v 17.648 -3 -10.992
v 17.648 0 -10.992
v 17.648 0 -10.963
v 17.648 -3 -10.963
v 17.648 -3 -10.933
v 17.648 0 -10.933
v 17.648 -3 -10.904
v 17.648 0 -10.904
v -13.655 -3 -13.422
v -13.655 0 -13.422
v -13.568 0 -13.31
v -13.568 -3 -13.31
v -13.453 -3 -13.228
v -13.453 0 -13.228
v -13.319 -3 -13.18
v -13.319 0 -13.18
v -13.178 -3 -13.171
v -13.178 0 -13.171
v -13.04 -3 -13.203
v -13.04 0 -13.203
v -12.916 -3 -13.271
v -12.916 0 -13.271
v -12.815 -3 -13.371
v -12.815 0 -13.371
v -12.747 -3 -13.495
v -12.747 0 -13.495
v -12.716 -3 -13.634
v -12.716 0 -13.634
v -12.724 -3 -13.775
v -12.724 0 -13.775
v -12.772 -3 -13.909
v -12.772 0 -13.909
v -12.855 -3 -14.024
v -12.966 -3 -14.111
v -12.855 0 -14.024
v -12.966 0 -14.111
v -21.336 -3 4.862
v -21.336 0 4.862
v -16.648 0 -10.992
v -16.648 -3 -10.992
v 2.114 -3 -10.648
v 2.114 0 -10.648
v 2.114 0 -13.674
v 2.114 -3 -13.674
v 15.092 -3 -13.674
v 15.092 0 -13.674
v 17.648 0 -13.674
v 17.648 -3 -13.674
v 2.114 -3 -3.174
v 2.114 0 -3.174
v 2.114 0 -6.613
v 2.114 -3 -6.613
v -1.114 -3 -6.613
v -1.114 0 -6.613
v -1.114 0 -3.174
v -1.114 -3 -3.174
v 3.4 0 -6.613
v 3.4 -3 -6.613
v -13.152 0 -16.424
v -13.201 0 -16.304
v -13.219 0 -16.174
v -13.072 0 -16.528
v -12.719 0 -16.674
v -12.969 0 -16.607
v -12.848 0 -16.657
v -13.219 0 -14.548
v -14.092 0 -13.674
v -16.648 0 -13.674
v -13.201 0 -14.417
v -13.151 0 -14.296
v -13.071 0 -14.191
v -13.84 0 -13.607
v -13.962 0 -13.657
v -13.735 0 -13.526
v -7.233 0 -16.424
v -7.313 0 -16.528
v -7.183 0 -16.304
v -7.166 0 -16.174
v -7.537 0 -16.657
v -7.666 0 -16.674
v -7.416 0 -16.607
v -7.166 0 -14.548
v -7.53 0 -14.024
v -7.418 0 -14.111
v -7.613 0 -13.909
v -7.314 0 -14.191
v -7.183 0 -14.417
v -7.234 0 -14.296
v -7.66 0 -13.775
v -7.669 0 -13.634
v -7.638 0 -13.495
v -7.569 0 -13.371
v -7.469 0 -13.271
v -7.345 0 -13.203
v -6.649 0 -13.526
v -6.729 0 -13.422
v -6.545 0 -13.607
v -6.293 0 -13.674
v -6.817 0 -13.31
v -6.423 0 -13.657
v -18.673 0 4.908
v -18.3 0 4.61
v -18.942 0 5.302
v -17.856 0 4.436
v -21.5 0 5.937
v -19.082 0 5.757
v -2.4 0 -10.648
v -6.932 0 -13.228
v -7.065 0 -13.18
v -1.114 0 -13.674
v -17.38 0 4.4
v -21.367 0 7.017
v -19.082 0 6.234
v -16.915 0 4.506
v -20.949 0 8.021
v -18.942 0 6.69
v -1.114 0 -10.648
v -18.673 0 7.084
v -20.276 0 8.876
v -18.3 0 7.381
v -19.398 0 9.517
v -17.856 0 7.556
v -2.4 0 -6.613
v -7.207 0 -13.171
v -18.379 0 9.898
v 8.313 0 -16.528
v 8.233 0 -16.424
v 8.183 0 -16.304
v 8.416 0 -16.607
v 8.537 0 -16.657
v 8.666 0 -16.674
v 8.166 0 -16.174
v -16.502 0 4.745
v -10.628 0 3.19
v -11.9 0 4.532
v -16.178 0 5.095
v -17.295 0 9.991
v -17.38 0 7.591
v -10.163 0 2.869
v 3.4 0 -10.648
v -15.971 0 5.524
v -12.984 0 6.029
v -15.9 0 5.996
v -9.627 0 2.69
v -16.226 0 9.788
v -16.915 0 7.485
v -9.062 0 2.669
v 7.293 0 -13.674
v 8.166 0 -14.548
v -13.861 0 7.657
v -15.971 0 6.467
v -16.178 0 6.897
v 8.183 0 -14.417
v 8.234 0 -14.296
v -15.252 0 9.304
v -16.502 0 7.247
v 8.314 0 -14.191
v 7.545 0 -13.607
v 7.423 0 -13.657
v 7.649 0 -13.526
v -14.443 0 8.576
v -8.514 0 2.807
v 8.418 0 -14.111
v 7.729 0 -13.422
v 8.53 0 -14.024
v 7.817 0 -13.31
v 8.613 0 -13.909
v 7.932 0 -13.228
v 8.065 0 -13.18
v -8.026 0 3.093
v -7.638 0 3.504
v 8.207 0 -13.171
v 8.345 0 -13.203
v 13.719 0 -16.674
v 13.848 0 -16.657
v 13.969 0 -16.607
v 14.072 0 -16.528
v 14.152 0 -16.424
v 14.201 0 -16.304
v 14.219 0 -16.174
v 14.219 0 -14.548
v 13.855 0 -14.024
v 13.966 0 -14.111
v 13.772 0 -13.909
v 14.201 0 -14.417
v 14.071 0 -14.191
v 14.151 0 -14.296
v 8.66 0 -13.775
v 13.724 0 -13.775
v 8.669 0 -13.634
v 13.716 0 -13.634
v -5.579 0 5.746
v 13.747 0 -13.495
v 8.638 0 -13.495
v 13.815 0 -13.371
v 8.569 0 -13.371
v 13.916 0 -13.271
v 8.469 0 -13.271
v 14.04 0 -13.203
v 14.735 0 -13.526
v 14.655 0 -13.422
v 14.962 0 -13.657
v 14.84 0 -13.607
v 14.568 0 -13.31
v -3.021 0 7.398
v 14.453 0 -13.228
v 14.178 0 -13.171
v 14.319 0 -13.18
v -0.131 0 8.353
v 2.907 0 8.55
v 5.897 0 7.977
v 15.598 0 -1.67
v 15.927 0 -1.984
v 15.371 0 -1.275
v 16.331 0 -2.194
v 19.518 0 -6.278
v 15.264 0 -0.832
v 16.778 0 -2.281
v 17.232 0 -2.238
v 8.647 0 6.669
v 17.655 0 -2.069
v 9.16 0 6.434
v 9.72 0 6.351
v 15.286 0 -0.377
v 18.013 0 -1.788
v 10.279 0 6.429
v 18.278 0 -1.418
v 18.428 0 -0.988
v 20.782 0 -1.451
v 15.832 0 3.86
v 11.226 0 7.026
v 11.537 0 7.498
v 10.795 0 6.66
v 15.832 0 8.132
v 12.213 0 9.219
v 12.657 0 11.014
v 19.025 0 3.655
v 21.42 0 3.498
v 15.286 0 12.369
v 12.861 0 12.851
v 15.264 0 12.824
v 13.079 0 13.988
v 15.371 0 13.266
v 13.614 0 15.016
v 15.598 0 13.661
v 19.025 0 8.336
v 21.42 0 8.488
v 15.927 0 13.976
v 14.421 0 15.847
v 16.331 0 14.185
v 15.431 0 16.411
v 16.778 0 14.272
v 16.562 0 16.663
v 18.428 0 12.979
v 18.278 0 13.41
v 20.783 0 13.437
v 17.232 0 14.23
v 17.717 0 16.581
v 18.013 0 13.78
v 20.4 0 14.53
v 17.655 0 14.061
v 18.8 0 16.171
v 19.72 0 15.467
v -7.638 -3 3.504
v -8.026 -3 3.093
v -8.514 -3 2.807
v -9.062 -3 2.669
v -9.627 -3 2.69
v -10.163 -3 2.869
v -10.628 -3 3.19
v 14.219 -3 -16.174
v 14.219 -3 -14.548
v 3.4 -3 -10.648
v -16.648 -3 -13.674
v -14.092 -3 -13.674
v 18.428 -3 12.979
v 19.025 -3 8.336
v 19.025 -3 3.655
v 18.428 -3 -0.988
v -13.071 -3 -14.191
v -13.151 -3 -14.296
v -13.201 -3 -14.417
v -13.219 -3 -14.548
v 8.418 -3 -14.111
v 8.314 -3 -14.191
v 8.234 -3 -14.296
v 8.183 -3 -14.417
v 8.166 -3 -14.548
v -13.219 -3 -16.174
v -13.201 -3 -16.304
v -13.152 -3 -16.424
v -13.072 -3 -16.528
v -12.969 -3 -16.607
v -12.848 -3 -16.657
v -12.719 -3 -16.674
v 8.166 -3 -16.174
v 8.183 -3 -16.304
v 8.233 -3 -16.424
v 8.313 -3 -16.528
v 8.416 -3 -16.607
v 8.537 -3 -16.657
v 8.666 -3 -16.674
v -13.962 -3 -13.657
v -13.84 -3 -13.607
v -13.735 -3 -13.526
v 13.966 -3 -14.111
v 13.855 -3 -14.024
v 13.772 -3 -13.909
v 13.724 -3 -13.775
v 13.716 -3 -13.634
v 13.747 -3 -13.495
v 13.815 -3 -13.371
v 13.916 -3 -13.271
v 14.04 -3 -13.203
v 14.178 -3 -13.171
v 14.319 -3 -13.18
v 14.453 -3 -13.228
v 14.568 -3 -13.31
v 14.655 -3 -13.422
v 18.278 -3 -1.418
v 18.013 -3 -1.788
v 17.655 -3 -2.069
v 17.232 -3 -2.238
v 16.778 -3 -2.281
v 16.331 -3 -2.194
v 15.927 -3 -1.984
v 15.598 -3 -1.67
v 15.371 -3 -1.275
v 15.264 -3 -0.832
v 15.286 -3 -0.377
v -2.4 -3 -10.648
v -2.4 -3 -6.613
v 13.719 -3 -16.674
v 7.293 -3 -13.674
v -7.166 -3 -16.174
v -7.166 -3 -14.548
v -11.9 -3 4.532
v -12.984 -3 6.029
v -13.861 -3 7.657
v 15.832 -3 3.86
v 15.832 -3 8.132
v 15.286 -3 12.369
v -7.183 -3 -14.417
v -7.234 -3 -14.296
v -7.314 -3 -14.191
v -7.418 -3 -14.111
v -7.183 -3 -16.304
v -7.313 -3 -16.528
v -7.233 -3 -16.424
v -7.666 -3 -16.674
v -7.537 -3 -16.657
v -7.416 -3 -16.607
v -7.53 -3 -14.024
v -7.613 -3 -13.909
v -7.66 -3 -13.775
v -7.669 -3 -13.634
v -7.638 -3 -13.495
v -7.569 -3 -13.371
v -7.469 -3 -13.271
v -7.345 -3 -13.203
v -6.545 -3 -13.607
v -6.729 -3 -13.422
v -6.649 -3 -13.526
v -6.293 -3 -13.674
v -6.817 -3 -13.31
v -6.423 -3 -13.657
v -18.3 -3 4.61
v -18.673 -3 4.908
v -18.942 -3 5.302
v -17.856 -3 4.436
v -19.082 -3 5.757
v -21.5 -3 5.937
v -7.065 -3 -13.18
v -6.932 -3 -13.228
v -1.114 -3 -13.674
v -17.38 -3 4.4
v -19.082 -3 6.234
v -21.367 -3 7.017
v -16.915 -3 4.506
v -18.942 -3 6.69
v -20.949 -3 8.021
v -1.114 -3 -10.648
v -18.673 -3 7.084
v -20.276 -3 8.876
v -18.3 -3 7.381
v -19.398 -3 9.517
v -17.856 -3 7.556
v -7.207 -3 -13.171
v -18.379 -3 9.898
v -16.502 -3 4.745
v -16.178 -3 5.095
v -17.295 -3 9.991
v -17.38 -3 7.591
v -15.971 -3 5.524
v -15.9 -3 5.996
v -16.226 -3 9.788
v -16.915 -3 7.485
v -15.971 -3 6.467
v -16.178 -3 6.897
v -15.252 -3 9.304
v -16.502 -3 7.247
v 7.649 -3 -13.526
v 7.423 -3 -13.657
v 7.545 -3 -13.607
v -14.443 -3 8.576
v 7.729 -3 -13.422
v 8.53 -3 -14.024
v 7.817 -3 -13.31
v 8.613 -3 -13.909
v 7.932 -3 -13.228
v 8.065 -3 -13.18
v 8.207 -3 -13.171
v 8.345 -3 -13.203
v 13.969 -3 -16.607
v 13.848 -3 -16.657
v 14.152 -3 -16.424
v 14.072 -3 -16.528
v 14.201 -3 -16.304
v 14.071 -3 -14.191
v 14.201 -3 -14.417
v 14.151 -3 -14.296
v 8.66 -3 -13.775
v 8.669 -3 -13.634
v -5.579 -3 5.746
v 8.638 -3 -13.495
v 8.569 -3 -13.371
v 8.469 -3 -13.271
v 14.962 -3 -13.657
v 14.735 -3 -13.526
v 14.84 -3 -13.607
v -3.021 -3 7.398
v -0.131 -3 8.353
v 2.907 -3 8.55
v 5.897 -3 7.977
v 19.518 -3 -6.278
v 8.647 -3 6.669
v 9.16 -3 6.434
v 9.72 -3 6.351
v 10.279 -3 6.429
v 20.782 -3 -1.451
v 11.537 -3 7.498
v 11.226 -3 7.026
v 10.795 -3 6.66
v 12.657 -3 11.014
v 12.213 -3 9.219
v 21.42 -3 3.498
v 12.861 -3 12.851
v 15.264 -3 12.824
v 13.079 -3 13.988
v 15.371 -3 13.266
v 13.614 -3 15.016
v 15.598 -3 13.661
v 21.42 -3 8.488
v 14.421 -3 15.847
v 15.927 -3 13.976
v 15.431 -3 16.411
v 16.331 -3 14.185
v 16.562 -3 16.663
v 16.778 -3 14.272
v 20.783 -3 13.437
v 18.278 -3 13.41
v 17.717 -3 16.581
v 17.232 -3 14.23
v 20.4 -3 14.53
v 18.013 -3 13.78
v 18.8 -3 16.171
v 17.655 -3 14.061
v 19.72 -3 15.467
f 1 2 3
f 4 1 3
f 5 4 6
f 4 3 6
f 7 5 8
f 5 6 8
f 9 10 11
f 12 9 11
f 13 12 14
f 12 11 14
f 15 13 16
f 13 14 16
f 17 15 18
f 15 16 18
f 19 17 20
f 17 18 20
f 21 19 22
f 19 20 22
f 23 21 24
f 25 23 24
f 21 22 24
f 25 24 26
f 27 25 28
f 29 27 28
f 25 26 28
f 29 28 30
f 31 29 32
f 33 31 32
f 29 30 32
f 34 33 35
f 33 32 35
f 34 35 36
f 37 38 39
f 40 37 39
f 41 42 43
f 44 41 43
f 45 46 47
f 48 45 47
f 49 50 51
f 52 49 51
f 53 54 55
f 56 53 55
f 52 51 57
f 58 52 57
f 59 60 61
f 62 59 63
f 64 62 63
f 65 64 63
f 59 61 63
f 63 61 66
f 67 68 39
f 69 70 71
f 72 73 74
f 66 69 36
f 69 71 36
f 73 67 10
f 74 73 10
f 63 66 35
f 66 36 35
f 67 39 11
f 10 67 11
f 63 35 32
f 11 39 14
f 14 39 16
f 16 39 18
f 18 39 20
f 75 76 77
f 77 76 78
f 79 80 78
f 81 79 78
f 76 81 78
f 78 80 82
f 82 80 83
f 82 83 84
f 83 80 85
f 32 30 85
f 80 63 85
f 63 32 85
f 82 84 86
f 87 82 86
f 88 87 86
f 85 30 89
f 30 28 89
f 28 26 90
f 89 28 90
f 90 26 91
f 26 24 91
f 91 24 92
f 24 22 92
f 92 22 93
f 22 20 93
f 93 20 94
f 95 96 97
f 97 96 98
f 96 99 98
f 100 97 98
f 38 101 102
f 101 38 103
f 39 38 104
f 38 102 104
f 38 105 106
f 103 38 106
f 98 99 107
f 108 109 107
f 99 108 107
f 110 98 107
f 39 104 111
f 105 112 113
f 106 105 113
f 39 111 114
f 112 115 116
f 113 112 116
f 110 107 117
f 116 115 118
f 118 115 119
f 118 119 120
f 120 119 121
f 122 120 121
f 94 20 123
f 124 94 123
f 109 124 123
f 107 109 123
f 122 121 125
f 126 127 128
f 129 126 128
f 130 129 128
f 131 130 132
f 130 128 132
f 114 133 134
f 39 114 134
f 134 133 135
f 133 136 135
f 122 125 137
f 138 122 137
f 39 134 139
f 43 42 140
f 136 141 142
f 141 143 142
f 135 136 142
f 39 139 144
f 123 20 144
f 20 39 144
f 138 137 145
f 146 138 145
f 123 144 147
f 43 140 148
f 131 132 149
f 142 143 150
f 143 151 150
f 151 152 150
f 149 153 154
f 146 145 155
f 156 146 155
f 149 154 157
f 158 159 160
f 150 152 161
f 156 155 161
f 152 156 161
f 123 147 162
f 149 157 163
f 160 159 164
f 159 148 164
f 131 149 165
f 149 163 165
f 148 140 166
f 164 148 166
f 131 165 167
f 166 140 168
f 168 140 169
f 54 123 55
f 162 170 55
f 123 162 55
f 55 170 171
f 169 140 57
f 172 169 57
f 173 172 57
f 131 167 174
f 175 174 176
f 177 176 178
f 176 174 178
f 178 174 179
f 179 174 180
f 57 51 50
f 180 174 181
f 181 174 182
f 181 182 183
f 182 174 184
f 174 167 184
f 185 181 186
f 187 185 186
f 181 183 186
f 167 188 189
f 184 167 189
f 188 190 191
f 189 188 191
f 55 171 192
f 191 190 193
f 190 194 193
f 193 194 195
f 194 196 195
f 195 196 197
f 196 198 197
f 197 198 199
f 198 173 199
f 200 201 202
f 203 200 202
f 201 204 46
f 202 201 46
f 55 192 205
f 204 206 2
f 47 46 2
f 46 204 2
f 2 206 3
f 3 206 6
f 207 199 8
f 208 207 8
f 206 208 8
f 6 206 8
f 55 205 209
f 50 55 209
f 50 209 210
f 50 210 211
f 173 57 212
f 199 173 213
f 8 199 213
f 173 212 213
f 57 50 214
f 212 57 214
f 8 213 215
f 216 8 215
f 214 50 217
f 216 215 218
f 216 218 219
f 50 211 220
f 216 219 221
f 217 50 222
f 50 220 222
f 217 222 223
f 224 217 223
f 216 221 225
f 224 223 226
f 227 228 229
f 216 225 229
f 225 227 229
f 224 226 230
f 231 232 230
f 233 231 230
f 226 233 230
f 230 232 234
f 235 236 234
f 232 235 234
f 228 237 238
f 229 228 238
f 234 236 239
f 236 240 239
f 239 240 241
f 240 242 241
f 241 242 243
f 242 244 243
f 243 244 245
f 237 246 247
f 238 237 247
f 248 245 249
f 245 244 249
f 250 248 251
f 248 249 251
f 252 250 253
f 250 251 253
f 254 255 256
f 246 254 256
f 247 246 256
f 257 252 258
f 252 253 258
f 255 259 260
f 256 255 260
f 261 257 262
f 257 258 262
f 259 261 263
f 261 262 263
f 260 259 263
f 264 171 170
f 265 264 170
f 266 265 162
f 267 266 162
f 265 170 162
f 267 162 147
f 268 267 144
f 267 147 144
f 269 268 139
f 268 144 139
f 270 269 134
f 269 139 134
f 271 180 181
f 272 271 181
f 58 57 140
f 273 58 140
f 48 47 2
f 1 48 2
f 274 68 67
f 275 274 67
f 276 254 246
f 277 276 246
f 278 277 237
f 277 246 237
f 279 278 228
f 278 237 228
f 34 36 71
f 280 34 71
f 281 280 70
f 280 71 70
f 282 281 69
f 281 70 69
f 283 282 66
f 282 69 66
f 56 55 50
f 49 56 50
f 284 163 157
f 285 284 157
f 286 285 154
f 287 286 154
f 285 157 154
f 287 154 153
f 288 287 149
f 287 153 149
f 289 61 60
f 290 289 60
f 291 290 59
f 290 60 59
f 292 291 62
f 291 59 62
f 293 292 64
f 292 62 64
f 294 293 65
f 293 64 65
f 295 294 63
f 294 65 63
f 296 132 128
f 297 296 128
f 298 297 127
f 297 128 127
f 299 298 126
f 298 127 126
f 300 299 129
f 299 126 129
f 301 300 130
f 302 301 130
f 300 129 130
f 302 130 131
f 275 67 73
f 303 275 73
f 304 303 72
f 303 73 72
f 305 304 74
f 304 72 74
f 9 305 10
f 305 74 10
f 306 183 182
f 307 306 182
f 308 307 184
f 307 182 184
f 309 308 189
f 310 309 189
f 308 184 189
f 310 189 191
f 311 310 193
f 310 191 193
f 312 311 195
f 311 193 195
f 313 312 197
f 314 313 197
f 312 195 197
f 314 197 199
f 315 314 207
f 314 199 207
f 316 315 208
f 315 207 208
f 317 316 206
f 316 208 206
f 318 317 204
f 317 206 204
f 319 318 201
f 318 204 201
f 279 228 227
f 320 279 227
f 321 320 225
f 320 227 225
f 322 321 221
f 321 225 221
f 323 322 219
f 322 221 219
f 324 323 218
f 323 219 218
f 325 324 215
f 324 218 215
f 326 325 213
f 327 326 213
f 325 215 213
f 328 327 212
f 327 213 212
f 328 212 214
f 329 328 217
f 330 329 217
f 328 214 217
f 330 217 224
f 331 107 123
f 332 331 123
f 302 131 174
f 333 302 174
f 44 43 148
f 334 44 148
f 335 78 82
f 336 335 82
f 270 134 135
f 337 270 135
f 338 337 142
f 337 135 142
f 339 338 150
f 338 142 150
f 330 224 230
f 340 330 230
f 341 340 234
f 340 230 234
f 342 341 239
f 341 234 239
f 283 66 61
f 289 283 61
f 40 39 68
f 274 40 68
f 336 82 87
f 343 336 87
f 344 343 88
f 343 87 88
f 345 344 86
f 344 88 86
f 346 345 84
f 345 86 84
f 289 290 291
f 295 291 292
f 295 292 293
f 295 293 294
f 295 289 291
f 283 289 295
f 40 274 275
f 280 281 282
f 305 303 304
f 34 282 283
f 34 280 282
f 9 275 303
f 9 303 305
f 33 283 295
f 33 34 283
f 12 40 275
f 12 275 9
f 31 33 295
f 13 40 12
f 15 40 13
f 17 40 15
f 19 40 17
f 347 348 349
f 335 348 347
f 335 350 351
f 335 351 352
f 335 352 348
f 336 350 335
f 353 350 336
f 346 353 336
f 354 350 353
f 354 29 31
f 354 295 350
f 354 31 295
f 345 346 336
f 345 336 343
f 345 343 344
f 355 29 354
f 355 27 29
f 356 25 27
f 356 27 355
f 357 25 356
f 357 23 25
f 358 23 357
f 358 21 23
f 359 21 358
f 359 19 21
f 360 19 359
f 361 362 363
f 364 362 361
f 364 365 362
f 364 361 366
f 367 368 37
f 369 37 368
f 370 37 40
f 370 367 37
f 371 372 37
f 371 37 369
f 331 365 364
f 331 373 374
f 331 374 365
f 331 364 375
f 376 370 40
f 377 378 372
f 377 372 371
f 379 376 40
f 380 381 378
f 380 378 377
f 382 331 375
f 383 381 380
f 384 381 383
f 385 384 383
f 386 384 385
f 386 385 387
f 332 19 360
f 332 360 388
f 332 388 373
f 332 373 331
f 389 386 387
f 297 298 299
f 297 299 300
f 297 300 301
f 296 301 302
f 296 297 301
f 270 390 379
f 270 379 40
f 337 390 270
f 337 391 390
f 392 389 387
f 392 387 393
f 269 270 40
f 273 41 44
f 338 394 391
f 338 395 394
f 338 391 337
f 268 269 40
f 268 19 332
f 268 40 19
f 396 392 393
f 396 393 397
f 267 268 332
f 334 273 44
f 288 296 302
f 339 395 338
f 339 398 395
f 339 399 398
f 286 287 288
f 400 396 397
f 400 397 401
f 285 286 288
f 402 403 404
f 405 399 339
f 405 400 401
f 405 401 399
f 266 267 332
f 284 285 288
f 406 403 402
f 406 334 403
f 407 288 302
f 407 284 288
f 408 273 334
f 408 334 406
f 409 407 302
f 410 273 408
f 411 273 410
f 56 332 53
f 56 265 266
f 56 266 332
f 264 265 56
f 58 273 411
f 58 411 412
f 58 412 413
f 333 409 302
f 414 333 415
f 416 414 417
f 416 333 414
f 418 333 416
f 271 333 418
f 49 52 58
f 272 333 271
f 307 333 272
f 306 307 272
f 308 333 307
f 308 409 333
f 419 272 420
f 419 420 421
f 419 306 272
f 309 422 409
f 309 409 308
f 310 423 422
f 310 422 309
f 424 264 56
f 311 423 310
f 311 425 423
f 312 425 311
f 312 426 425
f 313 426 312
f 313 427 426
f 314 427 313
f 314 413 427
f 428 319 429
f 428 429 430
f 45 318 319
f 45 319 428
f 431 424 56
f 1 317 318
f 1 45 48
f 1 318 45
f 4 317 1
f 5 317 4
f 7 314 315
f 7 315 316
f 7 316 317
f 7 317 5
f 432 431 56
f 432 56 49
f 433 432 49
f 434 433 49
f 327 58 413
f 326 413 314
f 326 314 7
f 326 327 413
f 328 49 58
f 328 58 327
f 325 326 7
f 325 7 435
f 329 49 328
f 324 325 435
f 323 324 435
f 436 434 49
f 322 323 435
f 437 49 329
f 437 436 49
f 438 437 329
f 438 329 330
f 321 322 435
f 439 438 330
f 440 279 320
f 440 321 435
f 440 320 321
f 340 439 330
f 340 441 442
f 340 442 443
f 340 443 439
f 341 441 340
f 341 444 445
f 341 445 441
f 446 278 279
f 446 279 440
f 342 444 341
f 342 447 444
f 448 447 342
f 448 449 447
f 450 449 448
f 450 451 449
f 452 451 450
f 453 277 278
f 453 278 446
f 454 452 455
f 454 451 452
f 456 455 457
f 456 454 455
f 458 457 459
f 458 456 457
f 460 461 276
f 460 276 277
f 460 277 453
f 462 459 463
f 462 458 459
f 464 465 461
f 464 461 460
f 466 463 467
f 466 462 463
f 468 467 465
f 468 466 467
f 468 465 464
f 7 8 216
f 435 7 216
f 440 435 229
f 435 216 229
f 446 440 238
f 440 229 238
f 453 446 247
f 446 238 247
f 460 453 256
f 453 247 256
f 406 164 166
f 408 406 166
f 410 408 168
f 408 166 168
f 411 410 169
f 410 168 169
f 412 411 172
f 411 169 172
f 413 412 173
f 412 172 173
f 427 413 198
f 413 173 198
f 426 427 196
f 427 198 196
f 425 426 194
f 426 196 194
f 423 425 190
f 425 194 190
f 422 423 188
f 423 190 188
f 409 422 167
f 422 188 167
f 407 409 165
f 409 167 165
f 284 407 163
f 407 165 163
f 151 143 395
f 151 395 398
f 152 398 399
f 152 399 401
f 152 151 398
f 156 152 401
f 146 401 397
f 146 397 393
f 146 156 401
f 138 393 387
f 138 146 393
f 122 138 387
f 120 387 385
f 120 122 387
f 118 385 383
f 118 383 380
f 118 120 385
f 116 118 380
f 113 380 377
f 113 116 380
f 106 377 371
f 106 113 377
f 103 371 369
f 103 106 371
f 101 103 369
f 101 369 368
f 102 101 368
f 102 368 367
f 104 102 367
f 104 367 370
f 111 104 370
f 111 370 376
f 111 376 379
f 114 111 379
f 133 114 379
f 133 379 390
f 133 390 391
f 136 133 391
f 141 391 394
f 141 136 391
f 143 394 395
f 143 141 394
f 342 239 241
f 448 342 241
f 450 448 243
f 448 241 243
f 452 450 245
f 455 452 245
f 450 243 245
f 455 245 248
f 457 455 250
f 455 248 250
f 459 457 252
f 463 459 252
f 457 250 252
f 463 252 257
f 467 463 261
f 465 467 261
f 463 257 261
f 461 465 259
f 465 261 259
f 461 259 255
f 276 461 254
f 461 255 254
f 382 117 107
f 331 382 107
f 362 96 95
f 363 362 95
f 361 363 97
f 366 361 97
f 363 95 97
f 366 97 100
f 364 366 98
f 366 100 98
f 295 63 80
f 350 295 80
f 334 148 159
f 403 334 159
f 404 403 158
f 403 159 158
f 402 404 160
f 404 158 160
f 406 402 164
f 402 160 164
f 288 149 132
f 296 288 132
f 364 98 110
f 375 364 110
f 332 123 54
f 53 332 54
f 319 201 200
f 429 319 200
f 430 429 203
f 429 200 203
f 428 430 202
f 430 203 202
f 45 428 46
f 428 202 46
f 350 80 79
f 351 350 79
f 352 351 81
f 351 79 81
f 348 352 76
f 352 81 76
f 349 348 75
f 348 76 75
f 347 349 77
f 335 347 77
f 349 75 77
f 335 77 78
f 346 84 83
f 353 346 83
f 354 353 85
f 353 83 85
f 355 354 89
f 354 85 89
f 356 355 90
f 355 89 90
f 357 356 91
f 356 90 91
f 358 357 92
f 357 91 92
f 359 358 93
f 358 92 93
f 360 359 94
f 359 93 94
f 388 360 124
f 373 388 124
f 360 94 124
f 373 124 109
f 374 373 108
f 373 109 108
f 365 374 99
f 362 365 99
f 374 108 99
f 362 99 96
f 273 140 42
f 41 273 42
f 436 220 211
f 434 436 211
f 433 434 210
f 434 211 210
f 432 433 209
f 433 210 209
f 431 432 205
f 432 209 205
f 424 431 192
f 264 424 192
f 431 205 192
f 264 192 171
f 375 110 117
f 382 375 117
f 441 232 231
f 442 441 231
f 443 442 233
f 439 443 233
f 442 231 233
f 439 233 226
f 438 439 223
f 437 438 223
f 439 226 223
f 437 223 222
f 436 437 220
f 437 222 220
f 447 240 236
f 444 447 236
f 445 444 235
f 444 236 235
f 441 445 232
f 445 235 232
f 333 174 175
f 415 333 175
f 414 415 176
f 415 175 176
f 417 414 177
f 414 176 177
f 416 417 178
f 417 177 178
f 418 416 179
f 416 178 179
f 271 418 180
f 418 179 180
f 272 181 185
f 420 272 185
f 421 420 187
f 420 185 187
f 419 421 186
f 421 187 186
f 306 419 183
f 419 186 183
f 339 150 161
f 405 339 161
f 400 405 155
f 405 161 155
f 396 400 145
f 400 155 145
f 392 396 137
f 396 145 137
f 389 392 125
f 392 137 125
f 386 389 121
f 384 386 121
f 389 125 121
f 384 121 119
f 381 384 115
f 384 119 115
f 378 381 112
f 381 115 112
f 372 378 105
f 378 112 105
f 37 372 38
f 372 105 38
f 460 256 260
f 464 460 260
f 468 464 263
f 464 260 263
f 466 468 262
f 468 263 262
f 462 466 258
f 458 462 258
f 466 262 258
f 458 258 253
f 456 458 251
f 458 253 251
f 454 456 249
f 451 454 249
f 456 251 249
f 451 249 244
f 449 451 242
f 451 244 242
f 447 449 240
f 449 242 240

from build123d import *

# Parameters (mm, degrees)
F0_R     = 1.6
F1_DEPTH = 3


# Not quite as in the source:
# - ends of sketch curves that miss each other by under 0.0002 mm in the source are joined


with BuildPart() as f1:
    # F0 (on Front) → F1 (new body)
    with BuildSketch(Plane.XZ):
        with BuildLine():
            ThreePointArc((-10.6282638986, 3.1898001668), (-12.4668430477, 5.2626032061), (-13.8612036619, 7.6568972993))
            ThreePointArc((-13.8612036619, 7.6568972993), (-18.9011019651, 9.7424118848), (-21.335831, 4.861629))
            Line((-21.335831, 4.861629), (-16.648169, -10.991964))
            Line((-16.648169, -10.991964), (-16.648169, -13.674139))
            Line((-16.648169, -13.674139), (-14.092108, -13.6741314818))
            ThreePointArc((-14.092108, -13.6741314818), (-13.8399289655, -13.6065603025), (-13.6553211195, -13.4219524128))
            ThreePointArc((-13.6553211195, -13.4219524128), (-12.8619020996, -13.3175012704), (-12.9663588806, -14.1109235459))
            ThreePointArc((-12.9663588806, -14.1109235459), (-13.1509652395, -14.295530508), (-13.2185364188, -14.5477095425))
            Line((-13.2185364188, -14.5477095425), (-13.2185364188, -16.174139))
            ThreePointArc((-13.2185364188, -16.174139), (-13.0720898094, -16.5276923906), (-12.7185364188, -16.674139))
            Line((-12.7185364188, -16.674139), (-7.66624, -16.674139))
            ThreePointArc((-7.66624, -16.674139), (-7.3126880282, -16.5276923906), (-7.1662414188, -16.174139))
            Line((-7.1662414188, -16.174139), (-7.1662414188, -14.547714))
            ThreePointArc((-7.1662414188, -14.547714), (-7.2338128147, -14.2955345905), (-7.4184212378, -14.1109266865))
            ThreePointArc((-7.4184212378, -14.1109266865), (-7.522878567, -13.3175058971), (-6.7294565149, -13.4219591693))
            ThreePointArc((-6.7294565149, -13.4219591693), (-6.5448489948, -13.6065653787), (-6.2926709268, -13.674136))
            Line((-6.2926709268, -13.674136), (-1.113951, -13.674139))
            Line((-1.113951, -13.674139), (-1.113951, -10.64802))
            Line((-1.113951, -10.64802), (-2.400059, -10.64802))
            Line((-2.400059, -10.64802), (-2.400059, -6.613128))
            Line((-2.400059, -6.613128), (-1.113951, -6.613128))
            Line((-1.113951, -6.613128), (-1.113951, -3.174139))
            Line((-1.113951, -3.174139), (2.113951, -3.174141))
            Line((2.113951, -3.174141), (2.113951, -6.613128))
            Line((2.113951, -6.613128), (3.400058, -6.613128))
            Line((3.400058, -6.613128), (3.400059, -10.64802))
            Line((3.400059, -10.64802), (2.113951, -10.64802))
            Line((2.113951, -10.64802), (2.113951, -13.674139))
            Line((2.113951, -13.674139), (7.292668, -13.6741438699))
            ThreePointArc((7.292668, -13.6741438699), (7.5448470345, -13.6065678207), (7.7294548805, -13.421959931))
            ThreePointArc((7.7294548805, -13.421959931), (8.5228769619, -13.3175030381), (8.418420181, -14.1109253135))
            ThreePointArc((8.418420181, -14.1109253135), (8.2338115208, -14.295533374), (8.16624, -14.547713))
            Line((8.16624, -14.547713), (8.1662414188, -16.174139))
            ThreePointArc((8.1662414188, -16.174139), (8.3126866094, -16.5276923906), (8.66624, -16.674139))
            Line((8.66624, -16.674139), (13.718535, -16.674139))
            ThreePointArc((13.718535, -16.674139), (14.0720883906, -16.5276923906), (14.218535, -16.174139))
            Line((14.218535, -16.174139), (14.2185364188, -14.547713))
            ThreePointArc((14.2185364188, -14.547713), (14.1509638207, -14.2955339655), (13.966355931, -14.1109261195))
            ThreePointArc((13.966355931, -14.1109261195), (13.8618988613, -13.3175032148), (14.6553213135, -13.421959819))
            ThreePointArc((14.6553213135, -13.421959819), (14.8399289655, -13.6065678207), (15.092108, -13.674139))
            Line((15.092108, -13.674139), (17.648169, -13.6741498688))
            Line((17.648169, -13.6741498688), (17.648169, -10.991964))
            ThreePointArc((17.648169, -10.991964), (17.6480727307, -10.9478940797), (17.6477839247, -10.9038250007))
            Line((17.6477839247, -10.9038250007), (17.648169, -10.904063))
            ThreePointArc((17.648169, -10.904063), (21.1804529898, 1.0136018582), (20.7834599948, 13.437375999))
            ThreePointArc((20.7834599948, 13.437375999), (16.5617773272, 16.6632341642), (12.8608694009, 12.8511420265))
            ThreePointArc((12.8608694009, 12.8511420265), (12.4649591094, 10.1088544895), (11.5367438755, 7.4982410587))
            ThreePointArc((11.5367438755, 7.4982410587), (10.2794941976, 6.4290215203), (8.6465971955, 6.6689263042))
            ThreePointArc((8.6465971955, 6.6689263042), (-0.1307148674, 8.353355038), (-7.6378988754, 3.5035408071))
            ThreePointArc((-7.6378988754, 3.5035408071), (-9.062025187, 2.6694105221), (-10.6282638986, 3.1898001668))
        make_face()
        with Locations((-17.5000000032, 5.995824999)):
            Circle(F0_R, mode=Mode.SUBTRACT)
        with BuildLine():
            ThreePointArc((18.4275548403, 12.979433969), (19.0999998798, 5.9958249766), (18.4275548403, -0.9877840157))
            ThreePointArc((18.4275548491, -0.9877839707), (16.5516572505, -2.2530936185), (15.2863477145, -0.3771959445))
            ThreePointArc((15.2863477057, -0.3771959895), (15.8999998798, 5.9958244858), (15.286347893, 12.3688449792))
            ThreePointArc((15.286347905, 12.3688449179), (16.5516567719, 14.2447434618), (18.4275548522, 12.9794339076))
        make_face(mode=Mode.SUBTRACT)
    extrude(amount=F1_DEPTH)


solid = f1.part
